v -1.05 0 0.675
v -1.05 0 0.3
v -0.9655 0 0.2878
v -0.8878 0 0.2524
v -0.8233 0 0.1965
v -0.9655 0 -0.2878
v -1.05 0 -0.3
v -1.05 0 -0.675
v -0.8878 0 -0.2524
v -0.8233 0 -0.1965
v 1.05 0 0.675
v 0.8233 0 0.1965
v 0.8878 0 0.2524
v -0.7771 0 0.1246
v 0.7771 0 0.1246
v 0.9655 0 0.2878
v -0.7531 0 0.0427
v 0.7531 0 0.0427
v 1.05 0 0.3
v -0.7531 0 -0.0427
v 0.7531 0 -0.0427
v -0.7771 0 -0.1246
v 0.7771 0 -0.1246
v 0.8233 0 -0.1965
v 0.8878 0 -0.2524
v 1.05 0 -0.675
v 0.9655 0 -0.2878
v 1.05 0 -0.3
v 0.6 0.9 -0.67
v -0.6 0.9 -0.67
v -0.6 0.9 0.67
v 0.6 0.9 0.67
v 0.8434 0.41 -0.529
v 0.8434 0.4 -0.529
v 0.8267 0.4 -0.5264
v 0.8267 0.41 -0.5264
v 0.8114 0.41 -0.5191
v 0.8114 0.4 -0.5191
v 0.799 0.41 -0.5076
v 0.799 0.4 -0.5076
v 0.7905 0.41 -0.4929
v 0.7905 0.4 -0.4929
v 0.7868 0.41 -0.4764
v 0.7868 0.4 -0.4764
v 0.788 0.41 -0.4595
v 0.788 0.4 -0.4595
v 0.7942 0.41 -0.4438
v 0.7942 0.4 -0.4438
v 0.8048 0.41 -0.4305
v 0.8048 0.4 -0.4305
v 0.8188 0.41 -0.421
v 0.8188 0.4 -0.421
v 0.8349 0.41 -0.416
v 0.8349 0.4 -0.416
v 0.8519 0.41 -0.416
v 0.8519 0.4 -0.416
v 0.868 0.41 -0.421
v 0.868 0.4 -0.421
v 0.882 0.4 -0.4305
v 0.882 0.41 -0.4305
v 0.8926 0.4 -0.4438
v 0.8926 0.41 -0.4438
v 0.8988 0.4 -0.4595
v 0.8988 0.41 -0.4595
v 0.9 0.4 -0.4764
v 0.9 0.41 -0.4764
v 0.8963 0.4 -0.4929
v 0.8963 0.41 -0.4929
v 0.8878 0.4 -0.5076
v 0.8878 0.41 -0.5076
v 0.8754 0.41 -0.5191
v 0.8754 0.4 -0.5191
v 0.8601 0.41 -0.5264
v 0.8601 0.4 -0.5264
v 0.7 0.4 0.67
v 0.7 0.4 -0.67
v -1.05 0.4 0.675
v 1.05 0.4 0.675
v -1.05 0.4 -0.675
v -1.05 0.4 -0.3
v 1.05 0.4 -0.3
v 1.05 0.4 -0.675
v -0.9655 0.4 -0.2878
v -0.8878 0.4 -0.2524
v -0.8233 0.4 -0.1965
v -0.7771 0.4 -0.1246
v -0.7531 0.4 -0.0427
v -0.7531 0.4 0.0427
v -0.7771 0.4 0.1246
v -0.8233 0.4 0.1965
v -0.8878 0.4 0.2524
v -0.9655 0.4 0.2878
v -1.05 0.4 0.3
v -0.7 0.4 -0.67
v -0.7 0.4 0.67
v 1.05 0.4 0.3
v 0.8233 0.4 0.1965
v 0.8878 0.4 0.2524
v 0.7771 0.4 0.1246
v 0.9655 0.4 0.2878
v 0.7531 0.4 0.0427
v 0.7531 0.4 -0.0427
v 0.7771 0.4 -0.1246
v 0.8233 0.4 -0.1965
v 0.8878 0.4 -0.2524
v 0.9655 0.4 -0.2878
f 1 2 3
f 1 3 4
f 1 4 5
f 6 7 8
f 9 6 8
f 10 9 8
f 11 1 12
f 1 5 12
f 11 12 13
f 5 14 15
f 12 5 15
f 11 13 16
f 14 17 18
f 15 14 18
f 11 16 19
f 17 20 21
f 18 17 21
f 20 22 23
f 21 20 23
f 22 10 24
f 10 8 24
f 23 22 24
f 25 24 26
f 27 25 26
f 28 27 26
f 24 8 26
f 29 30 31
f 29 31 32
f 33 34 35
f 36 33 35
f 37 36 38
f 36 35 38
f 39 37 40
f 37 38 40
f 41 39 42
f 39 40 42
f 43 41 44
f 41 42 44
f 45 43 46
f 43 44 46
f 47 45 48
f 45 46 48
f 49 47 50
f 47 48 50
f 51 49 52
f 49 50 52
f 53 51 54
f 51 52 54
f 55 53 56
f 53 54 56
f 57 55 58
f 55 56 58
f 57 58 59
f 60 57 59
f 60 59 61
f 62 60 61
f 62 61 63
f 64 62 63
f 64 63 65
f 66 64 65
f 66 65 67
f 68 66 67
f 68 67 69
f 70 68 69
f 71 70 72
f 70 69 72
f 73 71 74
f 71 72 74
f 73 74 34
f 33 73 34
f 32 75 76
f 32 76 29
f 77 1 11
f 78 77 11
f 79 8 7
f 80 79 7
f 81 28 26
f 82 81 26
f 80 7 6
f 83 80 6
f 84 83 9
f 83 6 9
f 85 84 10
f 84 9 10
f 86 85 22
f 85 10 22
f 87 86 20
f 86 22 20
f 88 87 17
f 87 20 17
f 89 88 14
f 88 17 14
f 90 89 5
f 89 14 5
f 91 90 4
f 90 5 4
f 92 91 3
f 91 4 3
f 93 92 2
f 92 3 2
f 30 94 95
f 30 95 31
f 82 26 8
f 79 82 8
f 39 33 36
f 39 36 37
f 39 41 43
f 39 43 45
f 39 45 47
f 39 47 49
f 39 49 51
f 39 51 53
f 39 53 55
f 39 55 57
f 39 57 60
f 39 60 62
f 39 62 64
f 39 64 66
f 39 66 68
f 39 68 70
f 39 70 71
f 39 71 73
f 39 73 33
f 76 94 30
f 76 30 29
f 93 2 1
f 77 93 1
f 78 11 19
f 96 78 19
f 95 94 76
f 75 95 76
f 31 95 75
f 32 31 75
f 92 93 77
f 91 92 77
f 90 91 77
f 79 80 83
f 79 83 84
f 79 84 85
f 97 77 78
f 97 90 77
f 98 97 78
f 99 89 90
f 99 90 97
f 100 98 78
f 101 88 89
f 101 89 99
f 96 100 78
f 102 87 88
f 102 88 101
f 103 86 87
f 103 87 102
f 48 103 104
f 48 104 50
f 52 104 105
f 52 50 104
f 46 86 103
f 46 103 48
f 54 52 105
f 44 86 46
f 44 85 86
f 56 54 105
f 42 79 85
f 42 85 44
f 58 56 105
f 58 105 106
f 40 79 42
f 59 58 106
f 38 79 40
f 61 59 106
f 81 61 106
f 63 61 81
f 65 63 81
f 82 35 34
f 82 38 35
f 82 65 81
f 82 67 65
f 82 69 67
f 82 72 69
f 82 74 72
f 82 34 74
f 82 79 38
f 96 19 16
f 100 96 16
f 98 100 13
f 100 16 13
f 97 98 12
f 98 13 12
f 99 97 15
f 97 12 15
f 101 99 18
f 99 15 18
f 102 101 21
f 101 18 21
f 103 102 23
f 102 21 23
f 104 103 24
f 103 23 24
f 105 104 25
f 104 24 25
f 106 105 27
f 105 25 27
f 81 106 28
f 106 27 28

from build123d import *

# Parameters (mm, degrees)
BOSS_EXTRUDE1_DEPTH = 0.4
SKETCH2_W           = 1.4
SKETCH2_H           = 1.34
BOSS_EXTRUDE2_DEPTH = 0.5
CHAMFER1_SIZE       = 0.5
CHAMFER1_SIZE_2     = 0.1
SKETCH3_R           = 0.05678725
BOSS_EXTRUDE3_DEPTH = 0.01


with BuildPart() as part:
    # Sketch1 → Boss-Extrude1 (new body)
    with BuildSketch(Plane(origin=(0, 0, 0), x_dir=(1, 0, 0), z_dir=(0, 1, 0))):
        with BuildLine():
            Line((-1.05, -0.675), (1.05, -0.675))
            Line((1.05, -0.675), (1.05, -0.3))
            ThreePointArc((1.05, -0.3), (0.75, 0), (1.05, 0.3))
            Line((1.05, 0.3), (1.05, 0.675))
            Line((1.05, 0.675), (-1.05, 0.675))
            Line((-1.05, 0.675), (-1.05, 0.3))
            ThreePointArc((-1.05, 0.3), (-0.75, 0), (-1.05, -0.3))
            Line((-1.05, -0.3), (-1.05, -0.675))
        make_face()
    extrude(amount=BOSS_EXTRUDE1_DEPTH)

    # Sketch3 → Boss-Extrude3 (add)
    with BuildSketch(Plane(origin=(0, 0.4, 0), x_dir=(1, 0, 0), z_dir=(0, 1, 0))):
        with Locations(Location((0.843395819, 0.472175465, 0), (0, 0, 90))):
            Circle(SKETCH3_R)
    extrude(amount=BOSS_EXTRUDE3_DEPTH)


with BuildPart() as body_2:
    # Sketch2 → Boss-Extrude2 (new body)
    with BuildSketch(Plane(origin=(0, 0.4, 0), x_dir=(1, 0, 0), z_dir=(0, 1, 0))):
        Rectangle(SKETCH2_W, SKETCH2_H)
    extrude(amount=BOSS_EXTRUDE2_DEPTH)

    # Chamfer1
    # the kernel refuses this chamfer: 0.5, 0.1 mm, written as the material it takes off along each edge
    with BuildSketch(Plane(origin=(0.7, 0.9, 1.969066043), x_dir=(0.007548351224040691, -0.9999715107910818, 0), z_dir=(0, 0, -1)), Plane(origin=(-0.7, 0.9, -1.969066043), x_dir=(-0.007548351224040691, -0.9999715107910818, 0), z_dir=(0, 0, 1))) as chamfer1_piece_1:
        Polygon((CHAMFER1_SIZE * 0.999971510791, CHAMFER1_SIZE * 0.00754835122404), (-CHAMFER1_SIZE_2 * 0.00754835122404, CHAMFER1_SIZE_2 * 0.999971510791), (0, 0), align=None)
    extrude(amount=3.938132086, mode=Mode.SUBTRACT)


solid = Compound([part.part, body_2.part])
